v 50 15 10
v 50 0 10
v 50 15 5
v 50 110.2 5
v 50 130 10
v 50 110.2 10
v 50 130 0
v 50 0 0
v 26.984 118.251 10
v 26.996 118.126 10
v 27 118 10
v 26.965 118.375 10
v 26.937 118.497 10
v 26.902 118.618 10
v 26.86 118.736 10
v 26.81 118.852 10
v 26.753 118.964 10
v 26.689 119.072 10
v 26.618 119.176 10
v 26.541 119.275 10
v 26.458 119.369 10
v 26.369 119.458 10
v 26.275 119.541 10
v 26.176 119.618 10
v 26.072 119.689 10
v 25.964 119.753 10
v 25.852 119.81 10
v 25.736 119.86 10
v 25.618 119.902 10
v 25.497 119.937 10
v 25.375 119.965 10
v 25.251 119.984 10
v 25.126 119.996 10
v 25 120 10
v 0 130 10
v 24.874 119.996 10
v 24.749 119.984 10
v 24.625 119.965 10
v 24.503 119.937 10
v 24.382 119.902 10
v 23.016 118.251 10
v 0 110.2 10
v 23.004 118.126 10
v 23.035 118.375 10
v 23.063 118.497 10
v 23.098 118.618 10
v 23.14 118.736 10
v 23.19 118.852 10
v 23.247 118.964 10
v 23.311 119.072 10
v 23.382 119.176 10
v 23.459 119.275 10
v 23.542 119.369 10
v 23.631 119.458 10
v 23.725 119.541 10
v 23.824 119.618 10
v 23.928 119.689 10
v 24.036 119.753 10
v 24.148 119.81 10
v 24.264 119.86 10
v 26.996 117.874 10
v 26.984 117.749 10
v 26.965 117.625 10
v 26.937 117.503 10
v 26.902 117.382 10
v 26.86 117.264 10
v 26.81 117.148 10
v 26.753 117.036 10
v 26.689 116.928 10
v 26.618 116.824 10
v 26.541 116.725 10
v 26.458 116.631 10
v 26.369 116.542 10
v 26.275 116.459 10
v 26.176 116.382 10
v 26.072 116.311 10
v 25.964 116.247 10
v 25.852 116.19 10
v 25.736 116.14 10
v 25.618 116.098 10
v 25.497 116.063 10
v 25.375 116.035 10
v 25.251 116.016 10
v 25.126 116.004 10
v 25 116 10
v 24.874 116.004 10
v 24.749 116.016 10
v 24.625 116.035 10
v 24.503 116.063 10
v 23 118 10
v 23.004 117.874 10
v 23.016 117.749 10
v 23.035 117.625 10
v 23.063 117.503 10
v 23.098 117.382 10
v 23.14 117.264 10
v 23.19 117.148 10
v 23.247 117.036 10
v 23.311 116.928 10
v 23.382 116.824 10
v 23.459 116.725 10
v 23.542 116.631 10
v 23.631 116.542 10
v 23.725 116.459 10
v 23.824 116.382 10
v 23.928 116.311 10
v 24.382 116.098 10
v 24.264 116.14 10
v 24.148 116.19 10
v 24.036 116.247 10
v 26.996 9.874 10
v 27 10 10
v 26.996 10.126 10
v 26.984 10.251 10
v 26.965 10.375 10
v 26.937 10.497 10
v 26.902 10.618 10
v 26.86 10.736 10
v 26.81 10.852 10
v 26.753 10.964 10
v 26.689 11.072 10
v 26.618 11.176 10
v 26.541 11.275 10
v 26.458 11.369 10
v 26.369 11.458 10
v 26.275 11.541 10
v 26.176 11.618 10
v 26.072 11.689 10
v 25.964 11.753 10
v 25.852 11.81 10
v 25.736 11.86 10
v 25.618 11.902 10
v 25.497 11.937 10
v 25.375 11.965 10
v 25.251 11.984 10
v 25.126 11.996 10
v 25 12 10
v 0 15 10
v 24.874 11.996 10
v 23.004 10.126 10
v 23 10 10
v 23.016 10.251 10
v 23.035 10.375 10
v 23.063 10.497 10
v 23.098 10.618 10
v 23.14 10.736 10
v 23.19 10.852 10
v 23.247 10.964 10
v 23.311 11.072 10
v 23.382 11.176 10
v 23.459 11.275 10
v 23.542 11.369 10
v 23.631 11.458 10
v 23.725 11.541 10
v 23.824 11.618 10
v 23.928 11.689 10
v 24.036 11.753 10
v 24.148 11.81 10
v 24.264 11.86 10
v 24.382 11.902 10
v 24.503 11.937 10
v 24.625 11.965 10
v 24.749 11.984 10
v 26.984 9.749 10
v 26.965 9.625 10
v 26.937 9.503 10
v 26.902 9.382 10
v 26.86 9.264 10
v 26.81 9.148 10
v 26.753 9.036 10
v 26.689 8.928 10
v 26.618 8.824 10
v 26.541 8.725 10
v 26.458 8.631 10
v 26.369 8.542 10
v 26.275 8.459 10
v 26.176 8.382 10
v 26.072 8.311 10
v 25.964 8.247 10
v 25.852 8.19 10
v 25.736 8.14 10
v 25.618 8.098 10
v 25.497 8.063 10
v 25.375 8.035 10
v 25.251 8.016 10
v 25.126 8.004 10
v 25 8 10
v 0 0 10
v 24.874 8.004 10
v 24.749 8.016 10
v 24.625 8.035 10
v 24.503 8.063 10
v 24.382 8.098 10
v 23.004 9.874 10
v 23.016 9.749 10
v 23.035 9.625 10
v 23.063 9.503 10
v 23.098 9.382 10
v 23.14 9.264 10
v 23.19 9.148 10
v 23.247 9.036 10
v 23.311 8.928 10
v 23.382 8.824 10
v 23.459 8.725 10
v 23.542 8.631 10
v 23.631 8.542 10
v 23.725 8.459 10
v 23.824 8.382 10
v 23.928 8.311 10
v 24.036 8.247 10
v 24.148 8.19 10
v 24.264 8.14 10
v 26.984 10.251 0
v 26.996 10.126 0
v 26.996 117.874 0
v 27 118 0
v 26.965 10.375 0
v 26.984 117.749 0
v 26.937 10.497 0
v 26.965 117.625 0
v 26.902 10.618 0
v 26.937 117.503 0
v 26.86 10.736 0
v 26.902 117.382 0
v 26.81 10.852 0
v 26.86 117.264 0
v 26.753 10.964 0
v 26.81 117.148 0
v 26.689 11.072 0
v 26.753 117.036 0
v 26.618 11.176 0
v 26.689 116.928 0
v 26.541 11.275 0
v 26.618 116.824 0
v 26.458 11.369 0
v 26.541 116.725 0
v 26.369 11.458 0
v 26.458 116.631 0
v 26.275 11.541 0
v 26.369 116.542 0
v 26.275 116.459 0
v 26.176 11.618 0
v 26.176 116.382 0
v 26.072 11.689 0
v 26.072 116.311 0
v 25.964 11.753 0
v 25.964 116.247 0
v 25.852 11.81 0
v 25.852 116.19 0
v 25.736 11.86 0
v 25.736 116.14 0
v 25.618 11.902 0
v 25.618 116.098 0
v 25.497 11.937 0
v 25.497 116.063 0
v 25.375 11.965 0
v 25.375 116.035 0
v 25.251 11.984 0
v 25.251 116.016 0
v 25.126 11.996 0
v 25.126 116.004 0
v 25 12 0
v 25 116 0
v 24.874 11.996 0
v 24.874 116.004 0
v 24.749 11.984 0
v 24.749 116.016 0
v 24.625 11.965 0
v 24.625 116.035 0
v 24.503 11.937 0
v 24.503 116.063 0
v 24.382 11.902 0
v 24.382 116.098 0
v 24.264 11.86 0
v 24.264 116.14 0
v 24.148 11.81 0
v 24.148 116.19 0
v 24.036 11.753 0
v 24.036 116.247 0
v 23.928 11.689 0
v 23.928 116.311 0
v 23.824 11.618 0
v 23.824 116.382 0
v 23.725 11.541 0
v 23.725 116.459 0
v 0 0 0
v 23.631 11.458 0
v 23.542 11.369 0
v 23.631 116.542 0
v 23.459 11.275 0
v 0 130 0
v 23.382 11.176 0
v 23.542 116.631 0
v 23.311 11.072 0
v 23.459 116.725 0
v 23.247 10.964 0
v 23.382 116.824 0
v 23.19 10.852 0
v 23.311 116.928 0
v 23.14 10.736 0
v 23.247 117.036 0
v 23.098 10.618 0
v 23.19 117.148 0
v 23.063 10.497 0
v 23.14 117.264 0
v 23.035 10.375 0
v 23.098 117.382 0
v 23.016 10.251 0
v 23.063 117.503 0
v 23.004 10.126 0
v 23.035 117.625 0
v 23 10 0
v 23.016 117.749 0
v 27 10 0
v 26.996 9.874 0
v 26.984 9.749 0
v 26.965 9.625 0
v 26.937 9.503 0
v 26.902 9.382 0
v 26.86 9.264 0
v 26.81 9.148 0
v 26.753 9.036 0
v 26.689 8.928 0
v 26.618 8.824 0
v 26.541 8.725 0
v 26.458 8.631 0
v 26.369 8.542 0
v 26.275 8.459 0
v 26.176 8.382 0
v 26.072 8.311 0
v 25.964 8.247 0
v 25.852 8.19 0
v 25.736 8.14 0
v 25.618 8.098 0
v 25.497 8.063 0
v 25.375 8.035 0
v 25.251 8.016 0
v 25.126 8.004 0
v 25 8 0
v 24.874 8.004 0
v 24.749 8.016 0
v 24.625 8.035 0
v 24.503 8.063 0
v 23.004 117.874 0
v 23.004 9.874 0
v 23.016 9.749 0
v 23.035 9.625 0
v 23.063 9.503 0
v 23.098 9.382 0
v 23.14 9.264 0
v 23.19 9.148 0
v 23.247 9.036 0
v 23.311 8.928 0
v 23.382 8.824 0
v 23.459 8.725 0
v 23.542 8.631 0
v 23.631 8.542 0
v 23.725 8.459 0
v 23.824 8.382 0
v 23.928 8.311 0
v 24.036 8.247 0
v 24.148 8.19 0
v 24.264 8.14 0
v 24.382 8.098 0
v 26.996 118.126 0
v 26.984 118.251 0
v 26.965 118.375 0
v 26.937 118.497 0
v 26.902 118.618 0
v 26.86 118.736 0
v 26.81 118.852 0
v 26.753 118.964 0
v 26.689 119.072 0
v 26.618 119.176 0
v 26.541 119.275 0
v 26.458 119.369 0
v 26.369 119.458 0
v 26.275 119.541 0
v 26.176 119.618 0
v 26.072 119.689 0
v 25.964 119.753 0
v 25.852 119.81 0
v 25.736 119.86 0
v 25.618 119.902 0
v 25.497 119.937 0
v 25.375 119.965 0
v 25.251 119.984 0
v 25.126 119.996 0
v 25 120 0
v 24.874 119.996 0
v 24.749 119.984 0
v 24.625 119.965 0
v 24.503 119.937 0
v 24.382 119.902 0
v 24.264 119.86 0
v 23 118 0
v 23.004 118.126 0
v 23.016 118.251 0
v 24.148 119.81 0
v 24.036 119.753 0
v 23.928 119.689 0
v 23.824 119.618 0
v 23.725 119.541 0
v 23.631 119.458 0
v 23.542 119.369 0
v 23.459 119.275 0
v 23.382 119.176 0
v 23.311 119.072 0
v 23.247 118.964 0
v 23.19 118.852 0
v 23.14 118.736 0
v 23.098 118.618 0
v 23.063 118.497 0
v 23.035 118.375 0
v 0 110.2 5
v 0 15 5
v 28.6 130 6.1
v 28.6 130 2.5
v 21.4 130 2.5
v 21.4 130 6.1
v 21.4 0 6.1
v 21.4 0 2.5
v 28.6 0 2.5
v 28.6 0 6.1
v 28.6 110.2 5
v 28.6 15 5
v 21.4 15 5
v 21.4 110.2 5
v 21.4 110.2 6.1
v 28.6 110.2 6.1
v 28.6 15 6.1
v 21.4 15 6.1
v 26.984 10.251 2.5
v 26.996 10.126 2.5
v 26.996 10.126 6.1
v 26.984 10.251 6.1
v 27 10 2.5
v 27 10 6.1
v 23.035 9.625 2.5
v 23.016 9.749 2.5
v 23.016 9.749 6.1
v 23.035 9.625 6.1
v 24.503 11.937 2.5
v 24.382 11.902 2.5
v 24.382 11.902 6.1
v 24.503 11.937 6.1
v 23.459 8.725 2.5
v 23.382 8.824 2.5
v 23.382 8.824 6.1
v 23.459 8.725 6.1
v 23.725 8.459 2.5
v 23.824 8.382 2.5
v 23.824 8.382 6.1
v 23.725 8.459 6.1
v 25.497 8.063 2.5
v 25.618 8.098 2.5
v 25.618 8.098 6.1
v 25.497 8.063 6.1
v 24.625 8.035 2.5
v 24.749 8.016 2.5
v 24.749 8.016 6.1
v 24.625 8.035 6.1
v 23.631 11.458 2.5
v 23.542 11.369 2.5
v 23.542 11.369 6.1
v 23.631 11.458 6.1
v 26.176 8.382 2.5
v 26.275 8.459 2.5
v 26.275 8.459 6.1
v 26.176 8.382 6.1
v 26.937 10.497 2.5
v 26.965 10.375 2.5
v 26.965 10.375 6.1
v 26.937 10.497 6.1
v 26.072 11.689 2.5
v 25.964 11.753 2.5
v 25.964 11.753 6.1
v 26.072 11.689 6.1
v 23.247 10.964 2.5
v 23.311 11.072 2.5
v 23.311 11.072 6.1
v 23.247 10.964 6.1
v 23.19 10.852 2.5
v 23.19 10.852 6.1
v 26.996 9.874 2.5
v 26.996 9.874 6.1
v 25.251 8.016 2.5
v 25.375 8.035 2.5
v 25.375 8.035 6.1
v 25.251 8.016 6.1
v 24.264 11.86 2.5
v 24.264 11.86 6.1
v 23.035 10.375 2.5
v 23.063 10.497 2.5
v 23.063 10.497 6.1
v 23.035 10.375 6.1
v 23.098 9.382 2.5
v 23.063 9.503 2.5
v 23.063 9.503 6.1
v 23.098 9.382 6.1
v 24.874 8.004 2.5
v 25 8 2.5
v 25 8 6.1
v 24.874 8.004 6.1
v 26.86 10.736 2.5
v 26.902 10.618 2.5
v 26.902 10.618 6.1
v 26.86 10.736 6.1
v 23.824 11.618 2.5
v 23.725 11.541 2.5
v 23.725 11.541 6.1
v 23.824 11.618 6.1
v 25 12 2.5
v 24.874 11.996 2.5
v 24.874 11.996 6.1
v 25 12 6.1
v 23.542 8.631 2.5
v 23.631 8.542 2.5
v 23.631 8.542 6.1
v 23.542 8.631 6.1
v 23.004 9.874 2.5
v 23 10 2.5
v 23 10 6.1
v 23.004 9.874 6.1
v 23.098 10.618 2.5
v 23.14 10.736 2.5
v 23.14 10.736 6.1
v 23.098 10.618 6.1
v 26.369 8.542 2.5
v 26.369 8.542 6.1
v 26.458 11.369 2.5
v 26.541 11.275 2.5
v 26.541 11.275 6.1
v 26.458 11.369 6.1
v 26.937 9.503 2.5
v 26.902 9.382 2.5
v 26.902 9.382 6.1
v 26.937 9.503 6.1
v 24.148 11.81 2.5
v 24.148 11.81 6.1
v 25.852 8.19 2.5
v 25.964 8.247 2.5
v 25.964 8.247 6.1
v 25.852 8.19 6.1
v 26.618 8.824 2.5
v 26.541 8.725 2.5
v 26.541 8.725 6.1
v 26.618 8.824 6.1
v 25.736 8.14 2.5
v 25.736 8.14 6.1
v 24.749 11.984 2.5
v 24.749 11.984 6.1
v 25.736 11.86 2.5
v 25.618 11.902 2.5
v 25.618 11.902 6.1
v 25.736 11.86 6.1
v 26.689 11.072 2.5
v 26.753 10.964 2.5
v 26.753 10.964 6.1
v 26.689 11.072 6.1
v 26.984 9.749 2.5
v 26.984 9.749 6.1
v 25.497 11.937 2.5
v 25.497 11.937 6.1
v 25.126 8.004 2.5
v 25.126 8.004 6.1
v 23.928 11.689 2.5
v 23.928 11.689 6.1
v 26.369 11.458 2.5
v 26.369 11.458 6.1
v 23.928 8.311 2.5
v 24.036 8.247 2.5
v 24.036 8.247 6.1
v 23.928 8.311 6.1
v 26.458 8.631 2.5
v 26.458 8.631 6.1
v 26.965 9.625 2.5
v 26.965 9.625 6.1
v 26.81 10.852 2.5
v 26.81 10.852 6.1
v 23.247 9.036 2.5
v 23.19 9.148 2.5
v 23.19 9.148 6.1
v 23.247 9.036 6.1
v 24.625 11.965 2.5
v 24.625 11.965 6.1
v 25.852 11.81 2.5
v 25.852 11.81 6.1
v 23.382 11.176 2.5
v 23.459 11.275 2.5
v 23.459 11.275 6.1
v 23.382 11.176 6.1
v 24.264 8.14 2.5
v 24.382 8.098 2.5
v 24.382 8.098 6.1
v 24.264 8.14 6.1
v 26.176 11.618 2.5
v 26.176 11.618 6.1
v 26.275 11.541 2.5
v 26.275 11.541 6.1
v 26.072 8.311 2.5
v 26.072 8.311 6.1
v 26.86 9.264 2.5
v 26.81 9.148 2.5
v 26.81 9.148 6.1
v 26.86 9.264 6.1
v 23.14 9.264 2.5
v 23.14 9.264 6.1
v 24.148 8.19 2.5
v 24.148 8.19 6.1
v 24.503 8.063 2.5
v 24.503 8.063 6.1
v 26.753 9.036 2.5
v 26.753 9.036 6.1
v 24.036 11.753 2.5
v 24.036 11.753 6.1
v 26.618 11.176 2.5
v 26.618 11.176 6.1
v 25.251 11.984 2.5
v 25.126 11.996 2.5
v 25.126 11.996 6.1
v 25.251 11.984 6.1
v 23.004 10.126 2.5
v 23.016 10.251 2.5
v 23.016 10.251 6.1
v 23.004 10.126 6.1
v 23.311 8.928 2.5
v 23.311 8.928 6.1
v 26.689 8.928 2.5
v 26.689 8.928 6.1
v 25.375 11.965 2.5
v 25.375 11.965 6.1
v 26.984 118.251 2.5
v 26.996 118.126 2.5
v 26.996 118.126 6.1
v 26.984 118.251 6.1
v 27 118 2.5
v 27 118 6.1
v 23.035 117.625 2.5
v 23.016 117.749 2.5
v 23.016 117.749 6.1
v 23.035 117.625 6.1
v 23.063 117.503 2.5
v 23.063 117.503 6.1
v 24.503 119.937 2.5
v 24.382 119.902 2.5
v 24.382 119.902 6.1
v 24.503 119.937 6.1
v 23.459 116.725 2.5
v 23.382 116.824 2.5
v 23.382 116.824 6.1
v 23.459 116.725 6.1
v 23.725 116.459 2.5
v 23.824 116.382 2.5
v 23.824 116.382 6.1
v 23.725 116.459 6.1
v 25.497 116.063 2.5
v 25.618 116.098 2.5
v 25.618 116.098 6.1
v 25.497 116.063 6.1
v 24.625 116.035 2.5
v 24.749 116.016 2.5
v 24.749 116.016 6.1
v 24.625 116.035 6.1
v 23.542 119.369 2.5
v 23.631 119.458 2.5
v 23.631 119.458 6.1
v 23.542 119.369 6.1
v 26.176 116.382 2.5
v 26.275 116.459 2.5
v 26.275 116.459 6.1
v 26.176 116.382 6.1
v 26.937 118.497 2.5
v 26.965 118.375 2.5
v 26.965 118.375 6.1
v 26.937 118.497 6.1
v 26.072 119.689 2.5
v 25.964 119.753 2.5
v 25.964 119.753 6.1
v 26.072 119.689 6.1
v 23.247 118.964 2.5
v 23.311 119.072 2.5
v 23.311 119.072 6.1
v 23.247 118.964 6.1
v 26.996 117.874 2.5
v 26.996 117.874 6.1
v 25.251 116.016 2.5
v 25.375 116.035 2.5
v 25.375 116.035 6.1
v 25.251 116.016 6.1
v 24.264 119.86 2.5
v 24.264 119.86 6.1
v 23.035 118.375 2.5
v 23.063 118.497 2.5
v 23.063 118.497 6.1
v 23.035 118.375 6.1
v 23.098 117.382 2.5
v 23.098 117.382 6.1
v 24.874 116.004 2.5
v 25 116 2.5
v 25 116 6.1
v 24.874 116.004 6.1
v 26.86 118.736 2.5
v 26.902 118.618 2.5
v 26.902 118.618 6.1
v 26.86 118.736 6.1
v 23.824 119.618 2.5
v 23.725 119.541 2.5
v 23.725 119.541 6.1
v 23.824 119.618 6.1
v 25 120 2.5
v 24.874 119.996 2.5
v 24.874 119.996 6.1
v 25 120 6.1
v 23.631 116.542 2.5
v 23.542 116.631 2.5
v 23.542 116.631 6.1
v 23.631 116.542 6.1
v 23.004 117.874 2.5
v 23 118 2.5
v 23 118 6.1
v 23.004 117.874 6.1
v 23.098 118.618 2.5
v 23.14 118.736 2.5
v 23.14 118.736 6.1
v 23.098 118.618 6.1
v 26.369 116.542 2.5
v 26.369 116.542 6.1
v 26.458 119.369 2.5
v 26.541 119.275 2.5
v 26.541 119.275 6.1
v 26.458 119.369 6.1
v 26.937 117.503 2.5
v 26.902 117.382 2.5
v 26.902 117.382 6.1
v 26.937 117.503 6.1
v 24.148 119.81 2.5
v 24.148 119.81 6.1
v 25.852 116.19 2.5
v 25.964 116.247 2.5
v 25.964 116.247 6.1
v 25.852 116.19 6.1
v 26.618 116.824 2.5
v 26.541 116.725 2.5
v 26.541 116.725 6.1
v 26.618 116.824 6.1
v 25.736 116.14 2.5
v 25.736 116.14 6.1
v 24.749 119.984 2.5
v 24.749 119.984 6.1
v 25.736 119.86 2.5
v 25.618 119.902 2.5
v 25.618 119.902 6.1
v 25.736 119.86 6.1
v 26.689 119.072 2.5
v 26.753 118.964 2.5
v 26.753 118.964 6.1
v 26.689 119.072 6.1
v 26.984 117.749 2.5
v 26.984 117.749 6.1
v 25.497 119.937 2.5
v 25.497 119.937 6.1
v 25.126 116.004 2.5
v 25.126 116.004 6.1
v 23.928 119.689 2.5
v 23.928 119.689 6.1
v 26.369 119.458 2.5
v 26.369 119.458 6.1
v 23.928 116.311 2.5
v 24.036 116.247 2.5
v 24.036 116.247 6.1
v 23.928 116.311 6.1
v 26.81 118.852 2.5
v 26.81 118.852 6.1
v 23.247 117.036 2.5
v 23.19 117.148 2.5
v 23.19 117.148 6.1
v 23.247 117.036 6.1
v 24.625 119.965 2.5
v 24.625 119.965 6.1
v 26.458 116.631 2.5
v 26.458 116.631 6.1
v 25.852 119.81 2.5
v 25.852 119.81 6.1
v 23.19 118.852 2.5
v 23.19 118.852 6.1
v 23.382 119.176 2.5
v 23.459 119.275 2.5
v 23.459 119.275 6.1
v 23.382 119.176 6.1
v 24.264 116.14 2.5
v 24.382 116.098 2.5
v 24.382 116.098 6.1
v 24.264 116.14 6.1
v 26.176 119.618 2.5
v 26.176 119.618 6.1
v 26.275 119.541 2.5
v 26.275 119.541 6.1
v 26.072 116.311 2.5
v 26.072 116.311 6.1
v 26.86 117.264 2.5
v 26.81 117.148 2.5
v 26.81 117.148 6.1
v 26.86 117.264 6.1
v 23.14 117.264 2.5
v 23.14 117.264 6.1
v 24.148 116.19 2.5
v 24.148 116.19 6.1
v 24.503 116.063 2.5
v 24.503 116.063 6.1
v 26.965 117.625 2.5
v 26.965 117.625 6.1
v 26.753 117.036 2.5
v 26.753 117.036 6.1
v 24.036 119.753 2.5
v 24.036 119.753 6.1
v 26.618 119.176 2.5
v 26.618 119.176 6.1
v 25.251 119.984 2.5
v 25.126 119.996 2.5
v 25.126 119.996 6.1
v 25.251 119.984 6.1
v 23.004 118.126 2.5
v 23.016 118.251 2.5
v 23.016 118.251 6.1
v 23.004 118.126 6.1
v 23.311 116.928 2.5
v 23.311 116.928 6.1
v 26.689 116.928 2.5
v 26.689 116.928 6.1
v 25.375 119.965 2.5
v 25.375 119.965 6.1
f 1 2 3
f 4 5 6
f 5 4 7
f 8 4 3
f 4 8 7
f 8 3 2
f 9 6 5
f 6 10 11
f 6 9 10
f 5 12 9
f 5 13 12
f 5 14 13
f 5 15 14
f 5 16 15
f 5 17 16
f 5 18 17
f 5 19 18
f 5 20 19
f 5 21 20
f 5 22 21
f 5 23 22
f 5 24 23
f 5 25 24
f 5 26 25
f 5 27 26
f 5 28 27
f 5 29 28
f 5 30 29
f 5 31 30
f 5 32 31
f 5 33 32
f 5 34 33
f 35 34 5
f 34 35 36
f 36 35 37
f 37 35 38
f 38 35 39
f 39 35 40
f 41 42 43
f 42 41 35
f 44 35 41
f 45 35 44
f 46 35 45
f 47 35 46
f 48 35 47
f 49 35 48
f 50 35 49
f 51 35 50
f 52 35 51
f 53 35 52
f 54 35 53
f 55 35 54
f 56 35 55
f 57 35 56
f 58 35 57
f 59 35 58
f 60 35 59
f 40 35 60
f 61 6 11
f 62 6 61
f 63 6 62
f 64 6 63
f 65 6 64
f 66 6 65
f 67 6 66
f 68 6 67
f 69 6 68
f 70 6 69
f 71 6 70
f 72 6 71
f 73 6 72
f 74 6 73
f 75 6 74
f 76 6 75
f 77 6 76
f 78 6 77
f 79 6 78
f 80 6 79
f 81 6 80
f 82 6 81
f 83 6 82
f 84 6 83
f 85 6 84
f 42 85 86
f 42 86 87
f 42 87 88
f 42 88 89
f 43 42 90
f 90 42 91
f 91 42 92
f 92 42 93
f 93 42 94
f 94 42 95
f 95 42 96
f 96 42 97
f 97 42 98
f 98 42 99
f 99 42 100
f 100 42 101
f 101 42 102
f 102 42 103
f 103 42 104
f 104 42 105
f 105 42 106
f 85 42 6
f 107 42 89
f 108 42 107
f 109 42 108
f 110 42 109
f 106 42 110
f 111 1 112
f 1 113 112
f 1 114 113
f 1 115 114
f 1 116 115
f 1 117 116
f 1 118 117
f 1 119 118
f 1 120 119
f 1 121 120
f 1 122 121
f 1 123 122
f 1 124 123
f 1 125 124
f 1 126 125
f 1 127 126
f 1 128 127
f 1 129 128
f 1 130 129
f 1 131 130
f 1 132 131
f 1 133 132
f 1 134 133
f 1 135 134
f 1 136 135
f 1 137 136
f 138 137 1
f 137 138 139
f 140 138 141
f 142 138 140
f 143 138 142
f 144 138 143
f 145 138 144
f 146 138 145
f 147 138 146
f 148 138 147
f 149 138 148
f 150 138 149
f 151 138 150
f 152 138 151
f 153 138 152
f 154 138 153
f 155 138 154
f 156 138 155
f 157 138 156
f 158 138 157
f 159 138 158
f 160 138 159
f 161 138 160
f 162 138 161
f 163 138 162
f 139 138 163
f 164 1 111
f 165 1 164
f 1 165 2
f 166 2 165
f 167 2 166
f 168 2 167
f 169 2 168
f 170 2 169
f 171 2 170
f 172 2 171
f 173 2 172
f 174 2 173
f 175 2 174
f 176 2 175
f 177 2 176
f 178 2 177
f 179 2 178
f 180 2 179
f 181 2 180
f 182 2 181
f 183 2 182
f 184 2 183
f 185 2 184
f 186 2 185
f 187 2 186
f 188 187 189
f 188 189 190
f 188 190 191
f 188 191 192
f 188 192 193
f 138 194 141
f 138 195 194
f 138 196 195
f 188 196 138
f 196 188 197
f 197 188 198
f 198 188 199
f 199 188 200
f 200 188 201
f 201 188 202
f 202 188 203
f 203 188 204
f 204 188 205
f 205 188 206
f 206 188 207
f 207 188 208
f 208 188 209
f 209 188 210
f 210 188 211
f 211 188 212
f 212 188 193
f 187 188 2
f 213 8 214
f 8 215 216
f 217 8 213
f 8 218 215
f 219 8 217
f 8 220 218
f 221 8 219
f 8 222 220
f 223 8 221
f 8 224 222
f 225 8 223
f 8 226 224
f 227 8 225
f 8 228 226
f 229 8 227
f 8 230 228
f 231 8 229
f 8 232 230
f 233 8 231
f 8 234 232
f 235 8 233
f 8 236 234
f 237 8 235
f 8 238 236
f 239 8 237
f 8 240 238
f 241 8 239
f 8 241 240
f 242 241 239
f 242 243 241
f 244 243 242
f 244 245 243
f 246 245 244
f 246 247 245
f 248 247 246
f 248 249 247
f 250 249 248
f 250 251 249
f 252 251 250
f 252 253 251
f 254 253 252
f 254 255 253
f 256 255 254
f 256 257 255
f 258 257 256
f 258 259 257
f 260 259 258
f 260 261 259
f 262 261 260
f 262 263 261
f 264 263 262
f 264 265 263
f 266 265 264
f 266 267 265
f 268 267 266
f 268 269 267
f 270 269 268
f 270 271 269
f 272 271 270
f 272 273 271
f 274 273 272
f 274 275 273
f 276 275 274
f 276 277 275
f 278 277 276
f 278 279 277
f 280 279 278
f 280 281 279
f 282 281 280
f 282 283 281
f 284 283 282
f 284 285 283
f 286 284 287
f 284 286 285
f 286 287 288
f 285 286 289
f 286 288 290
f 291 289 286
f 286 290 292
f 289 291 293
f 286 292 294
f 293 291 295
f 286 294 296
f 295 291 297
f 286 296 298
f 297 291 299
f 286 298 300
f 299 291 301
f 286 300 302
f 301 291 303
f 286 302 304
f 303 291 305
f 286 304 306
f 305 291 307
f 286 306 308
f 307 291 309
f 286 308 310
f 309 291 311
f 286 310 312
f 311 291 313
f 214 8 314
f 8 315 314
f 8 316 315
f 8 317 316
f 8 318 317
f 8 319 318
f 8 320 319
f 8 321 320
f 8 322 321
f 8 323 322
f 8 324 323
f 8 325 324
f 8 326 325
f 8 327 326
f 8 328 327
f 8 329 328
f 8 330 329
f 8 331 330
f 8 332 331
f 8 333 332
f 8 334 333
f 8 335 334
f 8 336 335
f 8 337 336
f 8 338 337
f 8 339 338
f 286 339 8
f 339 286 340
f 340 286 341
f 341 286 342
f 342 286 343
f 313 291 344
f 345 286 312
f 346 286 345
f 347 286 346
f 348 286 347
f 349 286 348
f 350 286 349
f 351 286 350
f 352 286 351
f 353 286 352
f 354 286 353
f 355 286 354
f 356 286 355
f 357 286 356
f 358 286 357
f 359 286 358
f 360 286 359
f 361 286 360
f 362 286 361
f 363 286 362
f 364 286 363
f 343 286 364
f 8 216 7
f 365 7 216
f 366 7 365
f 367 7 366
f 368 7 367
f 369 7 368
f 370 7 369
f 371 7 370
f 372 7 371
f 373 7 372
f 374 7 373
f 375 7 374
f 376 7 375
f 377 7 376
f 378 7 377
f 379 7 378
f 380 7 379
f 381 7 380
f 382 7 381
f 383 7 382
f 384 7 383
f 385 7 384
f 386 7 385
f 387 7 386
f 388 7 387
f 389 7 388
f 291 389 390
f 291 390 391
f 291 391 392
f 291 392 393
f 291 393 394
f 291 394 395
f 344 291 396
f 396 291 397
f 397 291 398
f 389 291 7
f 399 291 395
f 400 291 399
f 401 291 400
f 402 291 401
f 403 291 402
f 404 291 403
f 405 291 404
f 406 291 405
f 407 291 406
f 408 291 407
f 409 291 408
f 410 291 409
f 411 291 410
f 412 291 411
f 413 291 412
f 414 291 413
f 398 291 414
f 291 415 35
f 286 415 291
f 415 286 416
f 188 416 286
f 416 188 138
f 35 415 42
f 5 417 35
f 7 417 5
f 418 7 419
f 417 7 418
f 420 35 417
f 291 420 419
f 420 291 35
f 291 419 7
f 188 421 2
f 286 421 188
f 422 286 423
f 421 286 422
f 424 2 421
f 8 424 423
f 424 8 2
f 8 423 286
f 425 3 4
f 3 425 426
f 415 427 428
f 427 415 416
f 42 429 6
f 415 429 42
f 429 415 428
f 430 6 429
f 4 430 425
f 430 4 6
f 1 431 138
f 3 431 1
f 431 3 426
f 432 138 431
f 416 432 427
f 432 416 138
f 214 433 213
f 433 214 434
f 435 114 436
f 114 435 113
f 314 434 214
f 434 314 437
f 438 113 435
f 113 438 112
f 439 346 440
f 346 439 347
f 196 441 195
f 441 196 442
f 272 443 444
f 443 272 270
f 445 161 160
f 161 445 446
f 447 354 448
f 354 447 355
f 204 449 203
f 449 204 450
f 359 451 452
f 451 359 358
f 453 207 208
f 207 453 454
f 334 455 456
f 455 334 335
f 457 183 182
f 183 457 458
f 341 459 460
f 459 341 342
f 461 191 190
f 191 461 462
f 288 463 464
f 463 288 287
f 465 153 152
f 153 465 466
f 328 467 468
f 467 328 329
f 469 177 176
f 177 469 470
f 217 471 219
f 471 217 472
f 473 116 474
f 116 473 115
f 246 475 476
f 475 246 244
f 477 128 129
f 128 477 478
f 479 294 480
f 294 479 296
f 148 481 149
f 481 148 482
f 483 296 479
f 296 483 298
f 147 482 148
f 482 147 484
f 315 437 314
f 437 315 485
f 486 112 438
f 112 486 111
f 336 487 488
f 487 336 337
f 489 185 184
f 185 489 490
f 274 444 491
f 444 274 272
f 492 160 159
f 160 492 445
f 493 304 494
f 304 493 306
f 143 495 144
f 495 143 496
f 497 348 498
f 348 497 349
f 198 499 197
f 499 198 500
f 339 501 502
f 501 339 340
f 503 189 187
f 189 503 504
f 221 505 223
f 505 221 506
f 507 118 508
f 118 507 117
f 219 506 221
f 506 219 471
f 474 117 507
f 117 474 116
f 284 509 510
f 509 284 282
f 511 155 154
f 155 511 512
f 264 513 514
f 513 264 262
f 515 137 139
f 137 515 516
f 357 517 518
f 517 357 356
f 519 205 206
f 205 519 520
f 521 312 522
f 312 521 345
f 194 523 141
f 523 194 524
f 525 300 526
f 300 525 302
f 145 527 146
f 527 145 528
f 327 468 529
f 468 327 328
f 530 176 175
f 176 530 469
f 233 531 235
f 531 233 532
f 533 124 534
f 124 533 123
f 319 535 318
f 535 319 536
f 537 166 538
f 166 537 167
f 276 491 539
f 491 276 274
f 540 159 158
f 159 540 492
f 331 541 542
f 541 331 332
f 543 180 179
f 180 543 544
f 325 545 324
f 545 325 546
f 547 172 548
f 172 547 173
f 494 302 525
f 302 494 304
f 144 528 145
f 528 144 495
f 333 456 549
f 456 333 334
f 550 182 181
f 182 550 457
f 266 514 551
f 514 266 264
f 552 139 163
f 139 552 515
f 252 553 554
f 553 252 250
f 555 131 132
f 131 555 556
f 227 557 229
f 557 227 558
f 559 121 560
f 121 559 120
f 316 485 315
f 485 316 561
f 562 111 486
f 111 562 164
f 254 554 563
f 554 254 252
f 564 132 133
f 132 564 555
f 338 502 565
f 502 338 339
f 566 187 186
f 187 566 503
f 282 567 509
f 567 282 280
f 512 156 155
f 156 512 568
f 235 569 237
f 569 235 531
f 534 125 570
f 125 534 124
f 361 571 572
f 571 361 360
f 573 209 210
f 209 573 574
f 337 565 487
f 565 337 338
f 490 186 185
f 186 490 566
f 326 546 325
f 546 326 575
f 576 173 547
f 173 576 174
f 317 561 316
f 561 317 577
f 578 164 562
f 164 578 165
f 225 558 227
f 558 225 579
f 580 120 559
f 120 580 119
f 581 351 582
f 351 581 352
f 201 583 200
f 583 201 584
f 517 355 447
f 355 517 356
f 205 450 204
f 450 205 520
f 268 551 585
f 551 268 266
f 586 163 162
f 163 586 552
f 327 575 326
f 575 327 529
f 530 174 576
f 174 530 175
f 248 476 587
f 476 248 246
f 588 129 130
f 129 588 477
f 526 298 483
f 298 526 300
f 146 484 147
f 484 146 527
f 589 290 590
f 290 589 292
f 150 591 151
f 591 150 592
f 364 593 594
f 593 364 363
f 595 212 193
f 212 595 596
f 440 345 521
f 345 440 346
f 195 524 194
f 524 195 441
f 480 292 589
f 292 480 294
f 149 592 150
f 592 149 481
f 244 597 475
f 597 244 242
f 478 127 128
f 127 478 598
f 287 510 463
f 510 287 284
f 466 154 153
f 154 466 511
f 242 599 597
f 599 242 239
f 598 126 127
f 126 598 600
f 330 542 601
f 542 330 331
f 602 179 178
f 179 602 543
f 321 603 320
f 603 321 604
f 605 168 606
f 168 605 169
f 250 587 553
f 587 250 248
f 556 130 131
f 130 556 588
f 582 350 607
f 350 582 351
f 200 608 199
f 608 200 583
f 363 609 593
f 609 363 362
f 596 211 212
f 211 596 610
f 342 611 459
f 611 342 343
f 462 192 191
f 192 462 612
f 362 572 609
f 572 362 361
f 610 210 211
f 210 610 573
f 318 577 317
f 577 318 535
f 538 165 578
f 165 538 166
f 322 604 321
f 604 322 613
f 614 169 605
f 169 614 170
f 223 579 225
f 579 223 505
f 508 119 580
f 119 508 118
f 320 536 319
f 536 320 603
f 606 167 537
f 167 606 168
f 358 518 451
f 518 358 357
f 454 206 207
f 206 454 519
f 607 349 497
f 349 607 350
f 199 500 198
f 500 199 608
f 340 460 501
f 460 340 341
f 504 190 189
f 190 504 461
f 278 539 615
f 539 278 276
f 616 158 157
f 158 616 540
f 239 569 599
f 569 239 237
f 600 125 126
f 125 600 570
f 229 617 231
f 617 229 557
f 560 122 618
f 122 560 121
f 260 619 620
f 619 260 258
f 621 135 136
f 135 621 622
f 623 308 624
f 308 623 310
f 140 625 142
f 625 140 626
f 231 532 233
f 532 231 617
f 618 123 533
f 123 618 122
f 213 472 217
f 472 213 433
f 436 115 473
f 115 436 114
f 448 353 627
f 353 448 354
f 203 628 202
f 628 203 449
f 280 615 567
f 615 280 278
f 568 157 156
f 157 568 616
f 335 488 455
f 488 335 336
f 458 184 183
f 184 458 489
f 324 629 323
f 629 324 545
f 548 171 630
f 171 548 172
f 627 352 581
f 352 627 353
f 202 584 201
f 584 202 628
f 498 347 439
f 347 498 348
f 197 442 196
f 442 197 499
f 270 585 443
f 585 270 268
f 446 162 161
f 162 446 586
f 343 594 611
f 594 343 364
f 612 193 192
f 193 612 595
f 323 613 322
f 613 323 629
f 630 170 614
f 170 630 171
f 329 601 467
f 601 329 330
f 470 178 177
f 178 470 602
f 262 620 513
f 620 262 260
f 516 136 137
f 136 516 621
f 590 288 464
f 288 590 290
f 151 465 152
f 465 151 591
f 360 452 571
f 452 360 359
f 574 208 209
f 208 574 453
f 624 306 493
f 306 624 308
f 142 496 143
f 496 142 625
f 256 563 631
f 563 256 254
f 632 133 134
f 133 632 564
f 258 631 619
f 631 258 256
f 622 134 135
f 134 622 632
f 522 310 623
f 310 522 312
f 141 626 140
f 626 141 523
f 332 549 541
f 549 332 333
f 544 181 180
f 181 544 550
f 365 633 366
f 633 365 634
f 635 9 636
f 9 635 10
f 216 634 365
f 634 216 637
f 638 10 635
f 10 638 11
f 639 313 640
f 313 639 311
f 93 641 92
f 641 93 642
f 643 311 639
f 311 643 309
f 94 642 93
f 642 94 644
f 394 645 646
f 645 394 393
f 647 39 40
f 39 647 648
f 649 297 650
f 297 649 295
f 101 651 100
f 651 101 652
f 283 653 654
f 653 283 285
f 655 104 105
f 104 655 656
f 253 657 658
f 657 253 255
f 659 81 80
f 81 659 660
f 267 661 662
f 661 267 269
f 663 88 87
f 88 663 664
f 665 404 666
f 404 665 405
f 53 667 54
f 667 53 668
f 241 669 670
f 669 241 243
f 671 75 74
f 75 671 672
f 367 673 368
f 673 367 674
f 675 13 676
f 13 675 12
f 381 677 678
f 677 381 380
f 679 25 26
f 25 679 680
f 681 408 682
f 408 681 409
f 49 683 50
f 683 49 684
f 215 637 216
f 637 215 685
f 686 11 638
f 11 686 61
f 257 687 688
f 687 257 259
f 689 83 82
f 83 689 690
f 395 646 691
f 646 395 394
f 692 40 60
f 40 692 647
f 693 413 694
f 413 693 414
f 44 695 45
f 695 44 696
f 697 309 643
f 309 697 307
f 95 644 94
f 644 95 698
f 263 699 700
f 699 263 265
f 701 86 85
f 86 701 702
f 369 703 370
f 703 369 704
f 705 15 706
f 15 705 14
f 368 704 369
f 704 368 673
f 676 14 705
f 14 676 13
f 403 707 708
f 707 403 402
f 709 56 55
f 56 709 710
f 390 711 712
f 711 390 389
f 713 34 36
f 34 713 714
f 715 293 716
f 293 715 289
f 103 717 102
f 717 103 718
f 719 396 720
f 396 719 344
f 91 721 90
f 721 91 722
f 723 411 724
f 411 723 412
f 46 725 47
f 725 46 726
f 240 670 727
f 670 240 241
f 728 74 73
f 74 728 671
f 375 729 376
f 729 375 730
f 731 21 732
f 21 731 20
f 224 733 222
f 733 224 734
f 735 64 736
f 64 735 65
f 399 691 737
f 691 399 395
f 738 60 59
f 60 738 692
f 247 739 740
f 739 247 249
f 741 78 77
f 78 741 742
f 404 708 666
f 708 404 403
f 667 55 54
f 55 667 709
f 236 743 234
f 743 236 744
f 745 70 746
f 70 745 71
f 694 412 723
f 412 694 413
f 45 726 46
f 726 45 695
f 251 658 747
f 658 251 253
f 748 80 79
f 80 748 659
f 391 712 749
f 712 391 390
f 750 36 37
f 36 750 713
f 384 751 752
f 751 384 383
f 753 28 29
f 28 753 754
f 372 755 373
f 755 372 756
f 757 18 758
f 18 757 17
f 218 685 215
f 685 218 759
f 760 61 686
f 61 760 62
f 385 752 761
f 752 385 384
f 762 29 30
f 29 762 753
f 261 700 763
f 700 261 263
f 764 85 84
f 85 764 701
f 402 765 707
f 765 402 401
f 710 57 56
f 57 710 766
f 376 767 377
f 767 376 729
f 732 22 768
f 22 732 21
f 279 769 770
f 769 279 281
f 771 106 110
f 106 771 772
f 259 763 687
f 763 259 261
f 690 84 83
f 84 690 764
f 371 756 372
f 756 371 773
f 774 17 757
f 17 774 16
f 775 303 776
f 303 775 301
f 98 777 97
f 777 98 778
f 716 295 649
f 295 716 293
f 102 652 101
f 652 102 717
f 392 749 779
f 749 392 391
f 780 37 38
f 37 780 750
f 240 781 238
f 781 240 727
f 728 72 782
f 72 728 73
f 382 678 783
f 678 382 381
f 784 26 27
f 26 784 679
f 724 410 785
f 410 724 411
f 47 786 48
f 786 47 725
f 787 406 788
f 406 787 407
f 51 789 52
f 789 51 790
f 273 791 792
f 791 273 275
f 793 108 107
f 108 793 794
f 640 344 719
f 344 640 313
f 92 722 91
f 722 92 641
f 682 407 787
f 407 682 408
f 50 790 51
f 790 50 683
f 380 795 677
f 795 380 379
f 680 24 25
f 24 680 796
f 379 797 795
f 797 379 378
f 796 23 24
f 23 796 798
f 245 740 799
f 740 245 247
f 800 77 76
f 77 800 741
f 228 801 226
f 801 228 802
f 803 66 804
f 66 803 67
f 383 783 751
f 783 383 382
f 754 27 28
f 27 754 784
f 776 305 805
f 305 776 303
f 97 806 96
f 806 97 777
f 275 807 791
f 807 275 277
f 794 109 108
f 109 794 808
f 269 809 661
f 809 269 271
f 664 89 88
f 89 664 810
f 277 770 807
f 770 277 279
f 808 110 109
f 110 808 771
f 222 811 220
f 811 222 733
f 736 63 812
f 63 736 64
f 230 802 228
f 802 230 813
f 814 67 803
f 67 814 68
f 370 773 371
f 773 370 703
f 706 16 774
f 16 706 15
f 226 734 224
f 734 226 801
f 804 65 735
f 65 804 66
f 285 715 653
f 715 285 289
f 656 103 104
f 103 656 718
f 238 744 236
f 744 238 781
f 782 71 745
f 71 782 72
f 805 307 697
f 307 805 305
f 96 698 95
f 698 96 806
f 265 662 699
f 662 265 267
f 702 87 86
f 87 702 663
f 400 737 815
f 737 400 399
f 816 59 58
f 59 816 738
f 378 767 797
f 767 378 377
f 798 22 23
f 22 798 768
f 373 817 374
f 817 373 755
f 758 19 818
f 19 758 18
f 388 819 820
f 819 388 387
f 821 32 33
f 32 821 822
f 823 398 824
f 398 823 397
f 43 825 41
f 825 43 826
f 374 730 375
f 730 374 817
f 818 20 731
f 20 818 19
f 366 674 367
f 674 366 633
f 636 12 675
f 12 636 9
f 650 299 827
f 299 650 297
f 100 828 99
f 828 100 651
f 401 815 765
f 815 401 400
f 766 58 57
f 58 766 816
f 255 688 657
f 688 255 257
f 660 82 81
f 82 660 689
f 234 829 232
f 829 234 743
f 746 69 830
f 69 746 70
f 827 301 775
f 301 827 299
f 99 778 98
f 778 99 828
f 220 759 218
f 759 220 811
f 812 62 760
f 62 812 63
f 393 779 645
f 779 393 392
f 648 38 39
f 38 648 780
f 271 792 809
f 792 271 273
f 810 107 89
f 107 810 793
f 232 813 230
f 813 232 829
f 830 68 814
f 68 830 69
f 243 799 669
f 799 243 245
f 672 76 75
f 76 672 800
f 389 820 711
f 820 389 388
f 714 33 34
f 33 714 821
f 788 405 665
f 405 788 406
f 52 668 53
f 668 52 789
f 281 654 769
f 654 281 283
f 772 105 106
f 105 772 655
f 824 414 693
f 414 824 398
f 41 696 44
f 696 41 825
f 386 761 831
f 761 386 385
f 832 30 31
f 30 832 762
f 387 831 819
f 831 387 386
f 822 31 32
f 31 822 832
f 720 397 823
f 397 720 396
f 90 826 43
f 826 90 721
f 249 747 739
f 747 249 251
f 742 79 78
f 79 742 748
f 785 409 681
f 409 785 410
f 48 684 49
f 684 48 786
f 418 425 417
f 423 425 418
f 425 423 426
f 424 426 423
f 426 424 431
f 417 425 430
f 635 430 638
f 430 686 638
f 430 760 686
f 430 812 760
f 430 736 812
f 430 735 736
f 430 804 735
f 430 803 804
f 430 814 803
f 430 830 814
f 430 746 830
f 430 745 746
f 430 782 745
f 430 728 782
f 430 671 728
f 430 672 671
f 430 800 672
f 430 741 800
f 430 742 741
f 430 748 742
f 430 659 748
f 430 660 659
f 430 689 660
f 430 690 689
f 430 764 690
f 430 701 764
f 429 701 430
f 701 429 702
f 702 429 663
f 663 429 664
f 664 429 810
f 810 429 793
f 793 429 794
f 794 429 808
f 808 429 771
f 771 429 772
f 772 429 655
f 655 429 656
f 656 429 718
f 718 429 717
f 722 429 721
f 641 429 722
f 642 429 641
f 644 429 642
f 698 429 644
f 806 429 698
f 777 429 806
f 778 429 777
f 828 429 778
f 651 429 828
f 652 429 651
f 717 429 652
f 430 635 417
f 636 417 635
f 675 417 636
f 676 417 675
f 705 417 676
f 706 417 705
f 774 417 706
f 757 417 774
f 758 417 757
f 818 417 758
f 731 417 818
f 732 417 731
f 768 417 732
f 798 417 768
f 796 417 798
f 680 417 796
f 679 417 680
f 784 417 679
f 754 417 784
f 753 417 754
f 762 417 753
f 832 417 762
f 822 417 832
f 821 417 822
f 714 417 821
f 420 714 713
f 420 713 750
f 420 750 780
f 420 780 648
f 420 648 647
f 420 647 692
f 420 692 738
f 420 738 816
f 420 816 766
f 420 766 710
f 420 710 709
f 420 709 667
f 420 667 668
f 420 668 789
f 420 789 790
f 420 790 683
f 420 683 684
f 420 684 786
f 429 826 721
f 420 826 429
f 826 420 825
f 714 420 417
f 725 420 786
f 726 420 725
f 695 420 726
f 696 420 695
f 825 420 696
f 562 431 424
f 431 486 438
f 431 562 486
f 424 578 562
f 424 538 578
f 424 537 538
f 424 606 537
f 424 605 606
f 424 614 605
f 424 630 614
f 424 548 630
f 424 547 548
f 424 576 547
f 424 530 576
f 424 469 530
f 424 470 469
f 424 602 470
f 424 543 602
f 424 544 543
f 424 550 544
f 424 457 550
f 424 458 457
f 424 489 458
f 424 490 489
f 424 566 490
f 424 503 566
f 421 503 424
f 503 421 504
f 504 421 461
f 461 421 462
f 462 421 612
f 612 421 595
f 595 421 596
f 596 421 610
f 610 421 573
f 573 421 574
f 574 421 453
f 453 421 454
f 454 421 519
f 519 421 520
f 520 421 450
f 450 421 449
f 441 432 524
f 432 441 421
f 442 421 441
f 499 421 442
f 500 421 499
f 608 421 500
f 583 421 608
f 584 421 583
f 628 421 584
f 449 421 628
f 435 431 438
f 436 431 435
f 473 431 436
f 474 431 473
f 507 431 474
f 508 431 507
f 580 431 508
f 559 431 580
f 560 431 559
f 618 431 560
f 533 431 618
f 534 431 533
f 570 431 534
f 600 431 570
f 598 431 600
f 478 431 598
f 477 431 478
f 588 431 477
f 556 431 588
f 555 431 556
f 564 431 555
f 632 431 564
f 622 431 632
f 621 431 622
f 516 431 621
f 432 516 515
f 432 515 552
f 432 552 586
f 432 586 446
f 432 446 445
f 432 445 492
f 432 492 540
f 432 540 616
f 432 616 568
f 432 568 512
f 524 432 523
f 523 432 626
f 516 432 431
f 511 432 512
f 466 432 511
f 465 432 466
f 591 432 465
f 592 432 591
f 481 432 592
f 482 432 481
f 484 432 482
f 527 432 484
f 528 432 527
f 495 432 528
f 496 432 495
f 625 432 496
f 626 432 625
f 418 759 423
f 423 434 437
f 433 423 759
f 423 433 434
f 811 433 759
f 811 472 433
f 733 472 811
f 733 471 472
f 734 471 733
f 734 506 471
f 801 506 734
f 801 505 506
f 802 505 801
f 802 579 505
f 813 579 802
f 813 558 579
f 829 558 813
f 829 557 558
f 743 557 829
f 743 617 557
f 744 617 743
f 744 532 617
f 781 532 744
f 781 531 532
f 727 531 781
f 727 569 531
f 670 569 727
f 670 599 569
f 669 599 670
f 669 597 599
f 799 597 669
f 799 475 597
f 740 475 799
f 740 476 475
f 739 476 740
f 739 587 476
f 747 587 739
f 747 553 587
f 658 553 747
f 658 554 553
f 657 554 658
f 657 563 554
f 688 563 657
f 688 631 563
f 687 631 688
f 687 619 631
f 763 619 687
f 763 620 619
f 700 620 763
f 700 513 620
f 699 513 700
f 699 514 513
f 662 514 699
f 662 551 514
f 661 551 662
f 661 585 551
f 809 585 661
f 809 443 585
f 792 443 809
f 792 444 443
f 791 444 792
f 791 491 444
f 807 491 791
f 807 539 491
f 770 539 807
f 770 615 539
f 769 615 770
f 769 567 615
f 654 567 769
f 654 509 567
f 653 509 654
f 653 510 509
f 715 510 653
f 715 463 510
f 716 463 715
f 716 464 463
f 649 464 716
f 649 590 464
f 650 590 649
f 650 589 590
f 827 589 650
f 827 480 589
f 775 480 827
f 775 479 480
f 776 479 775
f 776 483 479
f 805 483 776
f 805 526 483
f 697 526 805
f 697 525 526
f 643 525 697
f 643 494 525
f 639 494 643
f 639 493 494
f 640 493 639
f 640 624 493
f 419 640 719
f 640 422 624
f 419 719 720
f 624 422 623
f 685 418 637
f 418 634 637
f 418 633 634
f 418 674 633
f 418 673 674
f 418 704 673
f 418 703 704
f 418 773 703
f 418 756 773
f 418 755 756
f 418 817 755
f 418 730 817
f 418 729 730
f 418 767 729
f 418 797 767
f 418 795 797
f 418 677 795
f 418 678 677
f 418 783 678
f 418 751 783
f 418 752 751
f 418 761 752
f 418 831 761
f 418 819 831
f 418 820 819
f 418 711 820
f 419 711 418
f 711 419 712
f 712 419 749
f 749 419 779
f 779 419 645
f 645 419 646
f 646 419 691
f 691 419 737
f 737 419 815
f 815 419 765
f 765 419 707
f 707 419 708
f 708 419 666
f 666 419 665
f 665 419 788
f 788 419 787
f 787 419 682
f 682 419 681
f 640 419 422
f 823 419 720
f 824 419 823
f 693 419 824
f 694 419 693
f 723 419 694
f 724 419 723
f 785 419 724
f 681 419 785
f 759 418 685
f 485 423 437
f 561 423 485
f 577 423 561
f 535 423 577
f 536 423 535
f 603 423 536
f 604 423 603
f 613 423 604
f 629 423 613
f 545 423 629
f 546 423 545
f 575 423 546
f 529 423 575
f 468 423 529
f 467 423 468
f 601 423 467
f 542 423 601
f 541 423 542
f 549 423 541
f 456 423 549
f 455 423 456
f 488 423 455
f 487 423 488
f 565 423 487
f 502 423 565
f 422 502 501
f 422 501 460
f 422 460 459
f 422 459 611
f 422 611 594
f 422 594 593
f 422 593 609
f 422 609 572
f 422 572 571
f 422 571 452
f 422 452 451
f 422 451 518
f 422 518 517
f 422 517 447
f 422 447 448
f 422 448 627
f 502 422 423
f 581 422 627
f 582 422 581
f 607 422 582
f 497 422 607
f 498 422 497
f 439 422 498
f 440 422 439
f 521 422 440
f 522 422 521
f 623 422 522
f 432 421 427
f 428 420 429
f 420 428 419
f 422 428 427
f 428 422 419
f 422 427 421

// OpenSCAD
// bottom clamp for the H2 cooling block holder

// m4 nut
nut_width = 7.2;
nut_height = 3.6;
holder_width = 55.2;

// m4 screw
screw_diameter = 4;

difference(){
    // main block
    cube([50,130,10]);
    // holder block cutout
    translate([0,30,5]) {
        cube([50, holder_width, 5]);
    }
    // fan cutout - 25 mm front
    translate([0, 85, 5]) {
        cube([50, 25.2, 10]);
    }
    // fan cutout - 15 mm back
    translate([0, 15, 5]) {
        cube([50, 15.2, 10]);
    }    
    // vertical hole 1
    translate([25, 10, 0]) {
        cylinder(d=screw_diameter, h=100, $fn=100);
    }
    // vertical hole 2
    translate([25, 118, 0]) {
        cylinder(d=screw_diameter, h=100, $fn=100);
    }
    // horiozontal hole
    translate([25-nut_width/2.0, -30, 2.5]) {
        cube([nut_width, 170, nut_height]);
    }
}
